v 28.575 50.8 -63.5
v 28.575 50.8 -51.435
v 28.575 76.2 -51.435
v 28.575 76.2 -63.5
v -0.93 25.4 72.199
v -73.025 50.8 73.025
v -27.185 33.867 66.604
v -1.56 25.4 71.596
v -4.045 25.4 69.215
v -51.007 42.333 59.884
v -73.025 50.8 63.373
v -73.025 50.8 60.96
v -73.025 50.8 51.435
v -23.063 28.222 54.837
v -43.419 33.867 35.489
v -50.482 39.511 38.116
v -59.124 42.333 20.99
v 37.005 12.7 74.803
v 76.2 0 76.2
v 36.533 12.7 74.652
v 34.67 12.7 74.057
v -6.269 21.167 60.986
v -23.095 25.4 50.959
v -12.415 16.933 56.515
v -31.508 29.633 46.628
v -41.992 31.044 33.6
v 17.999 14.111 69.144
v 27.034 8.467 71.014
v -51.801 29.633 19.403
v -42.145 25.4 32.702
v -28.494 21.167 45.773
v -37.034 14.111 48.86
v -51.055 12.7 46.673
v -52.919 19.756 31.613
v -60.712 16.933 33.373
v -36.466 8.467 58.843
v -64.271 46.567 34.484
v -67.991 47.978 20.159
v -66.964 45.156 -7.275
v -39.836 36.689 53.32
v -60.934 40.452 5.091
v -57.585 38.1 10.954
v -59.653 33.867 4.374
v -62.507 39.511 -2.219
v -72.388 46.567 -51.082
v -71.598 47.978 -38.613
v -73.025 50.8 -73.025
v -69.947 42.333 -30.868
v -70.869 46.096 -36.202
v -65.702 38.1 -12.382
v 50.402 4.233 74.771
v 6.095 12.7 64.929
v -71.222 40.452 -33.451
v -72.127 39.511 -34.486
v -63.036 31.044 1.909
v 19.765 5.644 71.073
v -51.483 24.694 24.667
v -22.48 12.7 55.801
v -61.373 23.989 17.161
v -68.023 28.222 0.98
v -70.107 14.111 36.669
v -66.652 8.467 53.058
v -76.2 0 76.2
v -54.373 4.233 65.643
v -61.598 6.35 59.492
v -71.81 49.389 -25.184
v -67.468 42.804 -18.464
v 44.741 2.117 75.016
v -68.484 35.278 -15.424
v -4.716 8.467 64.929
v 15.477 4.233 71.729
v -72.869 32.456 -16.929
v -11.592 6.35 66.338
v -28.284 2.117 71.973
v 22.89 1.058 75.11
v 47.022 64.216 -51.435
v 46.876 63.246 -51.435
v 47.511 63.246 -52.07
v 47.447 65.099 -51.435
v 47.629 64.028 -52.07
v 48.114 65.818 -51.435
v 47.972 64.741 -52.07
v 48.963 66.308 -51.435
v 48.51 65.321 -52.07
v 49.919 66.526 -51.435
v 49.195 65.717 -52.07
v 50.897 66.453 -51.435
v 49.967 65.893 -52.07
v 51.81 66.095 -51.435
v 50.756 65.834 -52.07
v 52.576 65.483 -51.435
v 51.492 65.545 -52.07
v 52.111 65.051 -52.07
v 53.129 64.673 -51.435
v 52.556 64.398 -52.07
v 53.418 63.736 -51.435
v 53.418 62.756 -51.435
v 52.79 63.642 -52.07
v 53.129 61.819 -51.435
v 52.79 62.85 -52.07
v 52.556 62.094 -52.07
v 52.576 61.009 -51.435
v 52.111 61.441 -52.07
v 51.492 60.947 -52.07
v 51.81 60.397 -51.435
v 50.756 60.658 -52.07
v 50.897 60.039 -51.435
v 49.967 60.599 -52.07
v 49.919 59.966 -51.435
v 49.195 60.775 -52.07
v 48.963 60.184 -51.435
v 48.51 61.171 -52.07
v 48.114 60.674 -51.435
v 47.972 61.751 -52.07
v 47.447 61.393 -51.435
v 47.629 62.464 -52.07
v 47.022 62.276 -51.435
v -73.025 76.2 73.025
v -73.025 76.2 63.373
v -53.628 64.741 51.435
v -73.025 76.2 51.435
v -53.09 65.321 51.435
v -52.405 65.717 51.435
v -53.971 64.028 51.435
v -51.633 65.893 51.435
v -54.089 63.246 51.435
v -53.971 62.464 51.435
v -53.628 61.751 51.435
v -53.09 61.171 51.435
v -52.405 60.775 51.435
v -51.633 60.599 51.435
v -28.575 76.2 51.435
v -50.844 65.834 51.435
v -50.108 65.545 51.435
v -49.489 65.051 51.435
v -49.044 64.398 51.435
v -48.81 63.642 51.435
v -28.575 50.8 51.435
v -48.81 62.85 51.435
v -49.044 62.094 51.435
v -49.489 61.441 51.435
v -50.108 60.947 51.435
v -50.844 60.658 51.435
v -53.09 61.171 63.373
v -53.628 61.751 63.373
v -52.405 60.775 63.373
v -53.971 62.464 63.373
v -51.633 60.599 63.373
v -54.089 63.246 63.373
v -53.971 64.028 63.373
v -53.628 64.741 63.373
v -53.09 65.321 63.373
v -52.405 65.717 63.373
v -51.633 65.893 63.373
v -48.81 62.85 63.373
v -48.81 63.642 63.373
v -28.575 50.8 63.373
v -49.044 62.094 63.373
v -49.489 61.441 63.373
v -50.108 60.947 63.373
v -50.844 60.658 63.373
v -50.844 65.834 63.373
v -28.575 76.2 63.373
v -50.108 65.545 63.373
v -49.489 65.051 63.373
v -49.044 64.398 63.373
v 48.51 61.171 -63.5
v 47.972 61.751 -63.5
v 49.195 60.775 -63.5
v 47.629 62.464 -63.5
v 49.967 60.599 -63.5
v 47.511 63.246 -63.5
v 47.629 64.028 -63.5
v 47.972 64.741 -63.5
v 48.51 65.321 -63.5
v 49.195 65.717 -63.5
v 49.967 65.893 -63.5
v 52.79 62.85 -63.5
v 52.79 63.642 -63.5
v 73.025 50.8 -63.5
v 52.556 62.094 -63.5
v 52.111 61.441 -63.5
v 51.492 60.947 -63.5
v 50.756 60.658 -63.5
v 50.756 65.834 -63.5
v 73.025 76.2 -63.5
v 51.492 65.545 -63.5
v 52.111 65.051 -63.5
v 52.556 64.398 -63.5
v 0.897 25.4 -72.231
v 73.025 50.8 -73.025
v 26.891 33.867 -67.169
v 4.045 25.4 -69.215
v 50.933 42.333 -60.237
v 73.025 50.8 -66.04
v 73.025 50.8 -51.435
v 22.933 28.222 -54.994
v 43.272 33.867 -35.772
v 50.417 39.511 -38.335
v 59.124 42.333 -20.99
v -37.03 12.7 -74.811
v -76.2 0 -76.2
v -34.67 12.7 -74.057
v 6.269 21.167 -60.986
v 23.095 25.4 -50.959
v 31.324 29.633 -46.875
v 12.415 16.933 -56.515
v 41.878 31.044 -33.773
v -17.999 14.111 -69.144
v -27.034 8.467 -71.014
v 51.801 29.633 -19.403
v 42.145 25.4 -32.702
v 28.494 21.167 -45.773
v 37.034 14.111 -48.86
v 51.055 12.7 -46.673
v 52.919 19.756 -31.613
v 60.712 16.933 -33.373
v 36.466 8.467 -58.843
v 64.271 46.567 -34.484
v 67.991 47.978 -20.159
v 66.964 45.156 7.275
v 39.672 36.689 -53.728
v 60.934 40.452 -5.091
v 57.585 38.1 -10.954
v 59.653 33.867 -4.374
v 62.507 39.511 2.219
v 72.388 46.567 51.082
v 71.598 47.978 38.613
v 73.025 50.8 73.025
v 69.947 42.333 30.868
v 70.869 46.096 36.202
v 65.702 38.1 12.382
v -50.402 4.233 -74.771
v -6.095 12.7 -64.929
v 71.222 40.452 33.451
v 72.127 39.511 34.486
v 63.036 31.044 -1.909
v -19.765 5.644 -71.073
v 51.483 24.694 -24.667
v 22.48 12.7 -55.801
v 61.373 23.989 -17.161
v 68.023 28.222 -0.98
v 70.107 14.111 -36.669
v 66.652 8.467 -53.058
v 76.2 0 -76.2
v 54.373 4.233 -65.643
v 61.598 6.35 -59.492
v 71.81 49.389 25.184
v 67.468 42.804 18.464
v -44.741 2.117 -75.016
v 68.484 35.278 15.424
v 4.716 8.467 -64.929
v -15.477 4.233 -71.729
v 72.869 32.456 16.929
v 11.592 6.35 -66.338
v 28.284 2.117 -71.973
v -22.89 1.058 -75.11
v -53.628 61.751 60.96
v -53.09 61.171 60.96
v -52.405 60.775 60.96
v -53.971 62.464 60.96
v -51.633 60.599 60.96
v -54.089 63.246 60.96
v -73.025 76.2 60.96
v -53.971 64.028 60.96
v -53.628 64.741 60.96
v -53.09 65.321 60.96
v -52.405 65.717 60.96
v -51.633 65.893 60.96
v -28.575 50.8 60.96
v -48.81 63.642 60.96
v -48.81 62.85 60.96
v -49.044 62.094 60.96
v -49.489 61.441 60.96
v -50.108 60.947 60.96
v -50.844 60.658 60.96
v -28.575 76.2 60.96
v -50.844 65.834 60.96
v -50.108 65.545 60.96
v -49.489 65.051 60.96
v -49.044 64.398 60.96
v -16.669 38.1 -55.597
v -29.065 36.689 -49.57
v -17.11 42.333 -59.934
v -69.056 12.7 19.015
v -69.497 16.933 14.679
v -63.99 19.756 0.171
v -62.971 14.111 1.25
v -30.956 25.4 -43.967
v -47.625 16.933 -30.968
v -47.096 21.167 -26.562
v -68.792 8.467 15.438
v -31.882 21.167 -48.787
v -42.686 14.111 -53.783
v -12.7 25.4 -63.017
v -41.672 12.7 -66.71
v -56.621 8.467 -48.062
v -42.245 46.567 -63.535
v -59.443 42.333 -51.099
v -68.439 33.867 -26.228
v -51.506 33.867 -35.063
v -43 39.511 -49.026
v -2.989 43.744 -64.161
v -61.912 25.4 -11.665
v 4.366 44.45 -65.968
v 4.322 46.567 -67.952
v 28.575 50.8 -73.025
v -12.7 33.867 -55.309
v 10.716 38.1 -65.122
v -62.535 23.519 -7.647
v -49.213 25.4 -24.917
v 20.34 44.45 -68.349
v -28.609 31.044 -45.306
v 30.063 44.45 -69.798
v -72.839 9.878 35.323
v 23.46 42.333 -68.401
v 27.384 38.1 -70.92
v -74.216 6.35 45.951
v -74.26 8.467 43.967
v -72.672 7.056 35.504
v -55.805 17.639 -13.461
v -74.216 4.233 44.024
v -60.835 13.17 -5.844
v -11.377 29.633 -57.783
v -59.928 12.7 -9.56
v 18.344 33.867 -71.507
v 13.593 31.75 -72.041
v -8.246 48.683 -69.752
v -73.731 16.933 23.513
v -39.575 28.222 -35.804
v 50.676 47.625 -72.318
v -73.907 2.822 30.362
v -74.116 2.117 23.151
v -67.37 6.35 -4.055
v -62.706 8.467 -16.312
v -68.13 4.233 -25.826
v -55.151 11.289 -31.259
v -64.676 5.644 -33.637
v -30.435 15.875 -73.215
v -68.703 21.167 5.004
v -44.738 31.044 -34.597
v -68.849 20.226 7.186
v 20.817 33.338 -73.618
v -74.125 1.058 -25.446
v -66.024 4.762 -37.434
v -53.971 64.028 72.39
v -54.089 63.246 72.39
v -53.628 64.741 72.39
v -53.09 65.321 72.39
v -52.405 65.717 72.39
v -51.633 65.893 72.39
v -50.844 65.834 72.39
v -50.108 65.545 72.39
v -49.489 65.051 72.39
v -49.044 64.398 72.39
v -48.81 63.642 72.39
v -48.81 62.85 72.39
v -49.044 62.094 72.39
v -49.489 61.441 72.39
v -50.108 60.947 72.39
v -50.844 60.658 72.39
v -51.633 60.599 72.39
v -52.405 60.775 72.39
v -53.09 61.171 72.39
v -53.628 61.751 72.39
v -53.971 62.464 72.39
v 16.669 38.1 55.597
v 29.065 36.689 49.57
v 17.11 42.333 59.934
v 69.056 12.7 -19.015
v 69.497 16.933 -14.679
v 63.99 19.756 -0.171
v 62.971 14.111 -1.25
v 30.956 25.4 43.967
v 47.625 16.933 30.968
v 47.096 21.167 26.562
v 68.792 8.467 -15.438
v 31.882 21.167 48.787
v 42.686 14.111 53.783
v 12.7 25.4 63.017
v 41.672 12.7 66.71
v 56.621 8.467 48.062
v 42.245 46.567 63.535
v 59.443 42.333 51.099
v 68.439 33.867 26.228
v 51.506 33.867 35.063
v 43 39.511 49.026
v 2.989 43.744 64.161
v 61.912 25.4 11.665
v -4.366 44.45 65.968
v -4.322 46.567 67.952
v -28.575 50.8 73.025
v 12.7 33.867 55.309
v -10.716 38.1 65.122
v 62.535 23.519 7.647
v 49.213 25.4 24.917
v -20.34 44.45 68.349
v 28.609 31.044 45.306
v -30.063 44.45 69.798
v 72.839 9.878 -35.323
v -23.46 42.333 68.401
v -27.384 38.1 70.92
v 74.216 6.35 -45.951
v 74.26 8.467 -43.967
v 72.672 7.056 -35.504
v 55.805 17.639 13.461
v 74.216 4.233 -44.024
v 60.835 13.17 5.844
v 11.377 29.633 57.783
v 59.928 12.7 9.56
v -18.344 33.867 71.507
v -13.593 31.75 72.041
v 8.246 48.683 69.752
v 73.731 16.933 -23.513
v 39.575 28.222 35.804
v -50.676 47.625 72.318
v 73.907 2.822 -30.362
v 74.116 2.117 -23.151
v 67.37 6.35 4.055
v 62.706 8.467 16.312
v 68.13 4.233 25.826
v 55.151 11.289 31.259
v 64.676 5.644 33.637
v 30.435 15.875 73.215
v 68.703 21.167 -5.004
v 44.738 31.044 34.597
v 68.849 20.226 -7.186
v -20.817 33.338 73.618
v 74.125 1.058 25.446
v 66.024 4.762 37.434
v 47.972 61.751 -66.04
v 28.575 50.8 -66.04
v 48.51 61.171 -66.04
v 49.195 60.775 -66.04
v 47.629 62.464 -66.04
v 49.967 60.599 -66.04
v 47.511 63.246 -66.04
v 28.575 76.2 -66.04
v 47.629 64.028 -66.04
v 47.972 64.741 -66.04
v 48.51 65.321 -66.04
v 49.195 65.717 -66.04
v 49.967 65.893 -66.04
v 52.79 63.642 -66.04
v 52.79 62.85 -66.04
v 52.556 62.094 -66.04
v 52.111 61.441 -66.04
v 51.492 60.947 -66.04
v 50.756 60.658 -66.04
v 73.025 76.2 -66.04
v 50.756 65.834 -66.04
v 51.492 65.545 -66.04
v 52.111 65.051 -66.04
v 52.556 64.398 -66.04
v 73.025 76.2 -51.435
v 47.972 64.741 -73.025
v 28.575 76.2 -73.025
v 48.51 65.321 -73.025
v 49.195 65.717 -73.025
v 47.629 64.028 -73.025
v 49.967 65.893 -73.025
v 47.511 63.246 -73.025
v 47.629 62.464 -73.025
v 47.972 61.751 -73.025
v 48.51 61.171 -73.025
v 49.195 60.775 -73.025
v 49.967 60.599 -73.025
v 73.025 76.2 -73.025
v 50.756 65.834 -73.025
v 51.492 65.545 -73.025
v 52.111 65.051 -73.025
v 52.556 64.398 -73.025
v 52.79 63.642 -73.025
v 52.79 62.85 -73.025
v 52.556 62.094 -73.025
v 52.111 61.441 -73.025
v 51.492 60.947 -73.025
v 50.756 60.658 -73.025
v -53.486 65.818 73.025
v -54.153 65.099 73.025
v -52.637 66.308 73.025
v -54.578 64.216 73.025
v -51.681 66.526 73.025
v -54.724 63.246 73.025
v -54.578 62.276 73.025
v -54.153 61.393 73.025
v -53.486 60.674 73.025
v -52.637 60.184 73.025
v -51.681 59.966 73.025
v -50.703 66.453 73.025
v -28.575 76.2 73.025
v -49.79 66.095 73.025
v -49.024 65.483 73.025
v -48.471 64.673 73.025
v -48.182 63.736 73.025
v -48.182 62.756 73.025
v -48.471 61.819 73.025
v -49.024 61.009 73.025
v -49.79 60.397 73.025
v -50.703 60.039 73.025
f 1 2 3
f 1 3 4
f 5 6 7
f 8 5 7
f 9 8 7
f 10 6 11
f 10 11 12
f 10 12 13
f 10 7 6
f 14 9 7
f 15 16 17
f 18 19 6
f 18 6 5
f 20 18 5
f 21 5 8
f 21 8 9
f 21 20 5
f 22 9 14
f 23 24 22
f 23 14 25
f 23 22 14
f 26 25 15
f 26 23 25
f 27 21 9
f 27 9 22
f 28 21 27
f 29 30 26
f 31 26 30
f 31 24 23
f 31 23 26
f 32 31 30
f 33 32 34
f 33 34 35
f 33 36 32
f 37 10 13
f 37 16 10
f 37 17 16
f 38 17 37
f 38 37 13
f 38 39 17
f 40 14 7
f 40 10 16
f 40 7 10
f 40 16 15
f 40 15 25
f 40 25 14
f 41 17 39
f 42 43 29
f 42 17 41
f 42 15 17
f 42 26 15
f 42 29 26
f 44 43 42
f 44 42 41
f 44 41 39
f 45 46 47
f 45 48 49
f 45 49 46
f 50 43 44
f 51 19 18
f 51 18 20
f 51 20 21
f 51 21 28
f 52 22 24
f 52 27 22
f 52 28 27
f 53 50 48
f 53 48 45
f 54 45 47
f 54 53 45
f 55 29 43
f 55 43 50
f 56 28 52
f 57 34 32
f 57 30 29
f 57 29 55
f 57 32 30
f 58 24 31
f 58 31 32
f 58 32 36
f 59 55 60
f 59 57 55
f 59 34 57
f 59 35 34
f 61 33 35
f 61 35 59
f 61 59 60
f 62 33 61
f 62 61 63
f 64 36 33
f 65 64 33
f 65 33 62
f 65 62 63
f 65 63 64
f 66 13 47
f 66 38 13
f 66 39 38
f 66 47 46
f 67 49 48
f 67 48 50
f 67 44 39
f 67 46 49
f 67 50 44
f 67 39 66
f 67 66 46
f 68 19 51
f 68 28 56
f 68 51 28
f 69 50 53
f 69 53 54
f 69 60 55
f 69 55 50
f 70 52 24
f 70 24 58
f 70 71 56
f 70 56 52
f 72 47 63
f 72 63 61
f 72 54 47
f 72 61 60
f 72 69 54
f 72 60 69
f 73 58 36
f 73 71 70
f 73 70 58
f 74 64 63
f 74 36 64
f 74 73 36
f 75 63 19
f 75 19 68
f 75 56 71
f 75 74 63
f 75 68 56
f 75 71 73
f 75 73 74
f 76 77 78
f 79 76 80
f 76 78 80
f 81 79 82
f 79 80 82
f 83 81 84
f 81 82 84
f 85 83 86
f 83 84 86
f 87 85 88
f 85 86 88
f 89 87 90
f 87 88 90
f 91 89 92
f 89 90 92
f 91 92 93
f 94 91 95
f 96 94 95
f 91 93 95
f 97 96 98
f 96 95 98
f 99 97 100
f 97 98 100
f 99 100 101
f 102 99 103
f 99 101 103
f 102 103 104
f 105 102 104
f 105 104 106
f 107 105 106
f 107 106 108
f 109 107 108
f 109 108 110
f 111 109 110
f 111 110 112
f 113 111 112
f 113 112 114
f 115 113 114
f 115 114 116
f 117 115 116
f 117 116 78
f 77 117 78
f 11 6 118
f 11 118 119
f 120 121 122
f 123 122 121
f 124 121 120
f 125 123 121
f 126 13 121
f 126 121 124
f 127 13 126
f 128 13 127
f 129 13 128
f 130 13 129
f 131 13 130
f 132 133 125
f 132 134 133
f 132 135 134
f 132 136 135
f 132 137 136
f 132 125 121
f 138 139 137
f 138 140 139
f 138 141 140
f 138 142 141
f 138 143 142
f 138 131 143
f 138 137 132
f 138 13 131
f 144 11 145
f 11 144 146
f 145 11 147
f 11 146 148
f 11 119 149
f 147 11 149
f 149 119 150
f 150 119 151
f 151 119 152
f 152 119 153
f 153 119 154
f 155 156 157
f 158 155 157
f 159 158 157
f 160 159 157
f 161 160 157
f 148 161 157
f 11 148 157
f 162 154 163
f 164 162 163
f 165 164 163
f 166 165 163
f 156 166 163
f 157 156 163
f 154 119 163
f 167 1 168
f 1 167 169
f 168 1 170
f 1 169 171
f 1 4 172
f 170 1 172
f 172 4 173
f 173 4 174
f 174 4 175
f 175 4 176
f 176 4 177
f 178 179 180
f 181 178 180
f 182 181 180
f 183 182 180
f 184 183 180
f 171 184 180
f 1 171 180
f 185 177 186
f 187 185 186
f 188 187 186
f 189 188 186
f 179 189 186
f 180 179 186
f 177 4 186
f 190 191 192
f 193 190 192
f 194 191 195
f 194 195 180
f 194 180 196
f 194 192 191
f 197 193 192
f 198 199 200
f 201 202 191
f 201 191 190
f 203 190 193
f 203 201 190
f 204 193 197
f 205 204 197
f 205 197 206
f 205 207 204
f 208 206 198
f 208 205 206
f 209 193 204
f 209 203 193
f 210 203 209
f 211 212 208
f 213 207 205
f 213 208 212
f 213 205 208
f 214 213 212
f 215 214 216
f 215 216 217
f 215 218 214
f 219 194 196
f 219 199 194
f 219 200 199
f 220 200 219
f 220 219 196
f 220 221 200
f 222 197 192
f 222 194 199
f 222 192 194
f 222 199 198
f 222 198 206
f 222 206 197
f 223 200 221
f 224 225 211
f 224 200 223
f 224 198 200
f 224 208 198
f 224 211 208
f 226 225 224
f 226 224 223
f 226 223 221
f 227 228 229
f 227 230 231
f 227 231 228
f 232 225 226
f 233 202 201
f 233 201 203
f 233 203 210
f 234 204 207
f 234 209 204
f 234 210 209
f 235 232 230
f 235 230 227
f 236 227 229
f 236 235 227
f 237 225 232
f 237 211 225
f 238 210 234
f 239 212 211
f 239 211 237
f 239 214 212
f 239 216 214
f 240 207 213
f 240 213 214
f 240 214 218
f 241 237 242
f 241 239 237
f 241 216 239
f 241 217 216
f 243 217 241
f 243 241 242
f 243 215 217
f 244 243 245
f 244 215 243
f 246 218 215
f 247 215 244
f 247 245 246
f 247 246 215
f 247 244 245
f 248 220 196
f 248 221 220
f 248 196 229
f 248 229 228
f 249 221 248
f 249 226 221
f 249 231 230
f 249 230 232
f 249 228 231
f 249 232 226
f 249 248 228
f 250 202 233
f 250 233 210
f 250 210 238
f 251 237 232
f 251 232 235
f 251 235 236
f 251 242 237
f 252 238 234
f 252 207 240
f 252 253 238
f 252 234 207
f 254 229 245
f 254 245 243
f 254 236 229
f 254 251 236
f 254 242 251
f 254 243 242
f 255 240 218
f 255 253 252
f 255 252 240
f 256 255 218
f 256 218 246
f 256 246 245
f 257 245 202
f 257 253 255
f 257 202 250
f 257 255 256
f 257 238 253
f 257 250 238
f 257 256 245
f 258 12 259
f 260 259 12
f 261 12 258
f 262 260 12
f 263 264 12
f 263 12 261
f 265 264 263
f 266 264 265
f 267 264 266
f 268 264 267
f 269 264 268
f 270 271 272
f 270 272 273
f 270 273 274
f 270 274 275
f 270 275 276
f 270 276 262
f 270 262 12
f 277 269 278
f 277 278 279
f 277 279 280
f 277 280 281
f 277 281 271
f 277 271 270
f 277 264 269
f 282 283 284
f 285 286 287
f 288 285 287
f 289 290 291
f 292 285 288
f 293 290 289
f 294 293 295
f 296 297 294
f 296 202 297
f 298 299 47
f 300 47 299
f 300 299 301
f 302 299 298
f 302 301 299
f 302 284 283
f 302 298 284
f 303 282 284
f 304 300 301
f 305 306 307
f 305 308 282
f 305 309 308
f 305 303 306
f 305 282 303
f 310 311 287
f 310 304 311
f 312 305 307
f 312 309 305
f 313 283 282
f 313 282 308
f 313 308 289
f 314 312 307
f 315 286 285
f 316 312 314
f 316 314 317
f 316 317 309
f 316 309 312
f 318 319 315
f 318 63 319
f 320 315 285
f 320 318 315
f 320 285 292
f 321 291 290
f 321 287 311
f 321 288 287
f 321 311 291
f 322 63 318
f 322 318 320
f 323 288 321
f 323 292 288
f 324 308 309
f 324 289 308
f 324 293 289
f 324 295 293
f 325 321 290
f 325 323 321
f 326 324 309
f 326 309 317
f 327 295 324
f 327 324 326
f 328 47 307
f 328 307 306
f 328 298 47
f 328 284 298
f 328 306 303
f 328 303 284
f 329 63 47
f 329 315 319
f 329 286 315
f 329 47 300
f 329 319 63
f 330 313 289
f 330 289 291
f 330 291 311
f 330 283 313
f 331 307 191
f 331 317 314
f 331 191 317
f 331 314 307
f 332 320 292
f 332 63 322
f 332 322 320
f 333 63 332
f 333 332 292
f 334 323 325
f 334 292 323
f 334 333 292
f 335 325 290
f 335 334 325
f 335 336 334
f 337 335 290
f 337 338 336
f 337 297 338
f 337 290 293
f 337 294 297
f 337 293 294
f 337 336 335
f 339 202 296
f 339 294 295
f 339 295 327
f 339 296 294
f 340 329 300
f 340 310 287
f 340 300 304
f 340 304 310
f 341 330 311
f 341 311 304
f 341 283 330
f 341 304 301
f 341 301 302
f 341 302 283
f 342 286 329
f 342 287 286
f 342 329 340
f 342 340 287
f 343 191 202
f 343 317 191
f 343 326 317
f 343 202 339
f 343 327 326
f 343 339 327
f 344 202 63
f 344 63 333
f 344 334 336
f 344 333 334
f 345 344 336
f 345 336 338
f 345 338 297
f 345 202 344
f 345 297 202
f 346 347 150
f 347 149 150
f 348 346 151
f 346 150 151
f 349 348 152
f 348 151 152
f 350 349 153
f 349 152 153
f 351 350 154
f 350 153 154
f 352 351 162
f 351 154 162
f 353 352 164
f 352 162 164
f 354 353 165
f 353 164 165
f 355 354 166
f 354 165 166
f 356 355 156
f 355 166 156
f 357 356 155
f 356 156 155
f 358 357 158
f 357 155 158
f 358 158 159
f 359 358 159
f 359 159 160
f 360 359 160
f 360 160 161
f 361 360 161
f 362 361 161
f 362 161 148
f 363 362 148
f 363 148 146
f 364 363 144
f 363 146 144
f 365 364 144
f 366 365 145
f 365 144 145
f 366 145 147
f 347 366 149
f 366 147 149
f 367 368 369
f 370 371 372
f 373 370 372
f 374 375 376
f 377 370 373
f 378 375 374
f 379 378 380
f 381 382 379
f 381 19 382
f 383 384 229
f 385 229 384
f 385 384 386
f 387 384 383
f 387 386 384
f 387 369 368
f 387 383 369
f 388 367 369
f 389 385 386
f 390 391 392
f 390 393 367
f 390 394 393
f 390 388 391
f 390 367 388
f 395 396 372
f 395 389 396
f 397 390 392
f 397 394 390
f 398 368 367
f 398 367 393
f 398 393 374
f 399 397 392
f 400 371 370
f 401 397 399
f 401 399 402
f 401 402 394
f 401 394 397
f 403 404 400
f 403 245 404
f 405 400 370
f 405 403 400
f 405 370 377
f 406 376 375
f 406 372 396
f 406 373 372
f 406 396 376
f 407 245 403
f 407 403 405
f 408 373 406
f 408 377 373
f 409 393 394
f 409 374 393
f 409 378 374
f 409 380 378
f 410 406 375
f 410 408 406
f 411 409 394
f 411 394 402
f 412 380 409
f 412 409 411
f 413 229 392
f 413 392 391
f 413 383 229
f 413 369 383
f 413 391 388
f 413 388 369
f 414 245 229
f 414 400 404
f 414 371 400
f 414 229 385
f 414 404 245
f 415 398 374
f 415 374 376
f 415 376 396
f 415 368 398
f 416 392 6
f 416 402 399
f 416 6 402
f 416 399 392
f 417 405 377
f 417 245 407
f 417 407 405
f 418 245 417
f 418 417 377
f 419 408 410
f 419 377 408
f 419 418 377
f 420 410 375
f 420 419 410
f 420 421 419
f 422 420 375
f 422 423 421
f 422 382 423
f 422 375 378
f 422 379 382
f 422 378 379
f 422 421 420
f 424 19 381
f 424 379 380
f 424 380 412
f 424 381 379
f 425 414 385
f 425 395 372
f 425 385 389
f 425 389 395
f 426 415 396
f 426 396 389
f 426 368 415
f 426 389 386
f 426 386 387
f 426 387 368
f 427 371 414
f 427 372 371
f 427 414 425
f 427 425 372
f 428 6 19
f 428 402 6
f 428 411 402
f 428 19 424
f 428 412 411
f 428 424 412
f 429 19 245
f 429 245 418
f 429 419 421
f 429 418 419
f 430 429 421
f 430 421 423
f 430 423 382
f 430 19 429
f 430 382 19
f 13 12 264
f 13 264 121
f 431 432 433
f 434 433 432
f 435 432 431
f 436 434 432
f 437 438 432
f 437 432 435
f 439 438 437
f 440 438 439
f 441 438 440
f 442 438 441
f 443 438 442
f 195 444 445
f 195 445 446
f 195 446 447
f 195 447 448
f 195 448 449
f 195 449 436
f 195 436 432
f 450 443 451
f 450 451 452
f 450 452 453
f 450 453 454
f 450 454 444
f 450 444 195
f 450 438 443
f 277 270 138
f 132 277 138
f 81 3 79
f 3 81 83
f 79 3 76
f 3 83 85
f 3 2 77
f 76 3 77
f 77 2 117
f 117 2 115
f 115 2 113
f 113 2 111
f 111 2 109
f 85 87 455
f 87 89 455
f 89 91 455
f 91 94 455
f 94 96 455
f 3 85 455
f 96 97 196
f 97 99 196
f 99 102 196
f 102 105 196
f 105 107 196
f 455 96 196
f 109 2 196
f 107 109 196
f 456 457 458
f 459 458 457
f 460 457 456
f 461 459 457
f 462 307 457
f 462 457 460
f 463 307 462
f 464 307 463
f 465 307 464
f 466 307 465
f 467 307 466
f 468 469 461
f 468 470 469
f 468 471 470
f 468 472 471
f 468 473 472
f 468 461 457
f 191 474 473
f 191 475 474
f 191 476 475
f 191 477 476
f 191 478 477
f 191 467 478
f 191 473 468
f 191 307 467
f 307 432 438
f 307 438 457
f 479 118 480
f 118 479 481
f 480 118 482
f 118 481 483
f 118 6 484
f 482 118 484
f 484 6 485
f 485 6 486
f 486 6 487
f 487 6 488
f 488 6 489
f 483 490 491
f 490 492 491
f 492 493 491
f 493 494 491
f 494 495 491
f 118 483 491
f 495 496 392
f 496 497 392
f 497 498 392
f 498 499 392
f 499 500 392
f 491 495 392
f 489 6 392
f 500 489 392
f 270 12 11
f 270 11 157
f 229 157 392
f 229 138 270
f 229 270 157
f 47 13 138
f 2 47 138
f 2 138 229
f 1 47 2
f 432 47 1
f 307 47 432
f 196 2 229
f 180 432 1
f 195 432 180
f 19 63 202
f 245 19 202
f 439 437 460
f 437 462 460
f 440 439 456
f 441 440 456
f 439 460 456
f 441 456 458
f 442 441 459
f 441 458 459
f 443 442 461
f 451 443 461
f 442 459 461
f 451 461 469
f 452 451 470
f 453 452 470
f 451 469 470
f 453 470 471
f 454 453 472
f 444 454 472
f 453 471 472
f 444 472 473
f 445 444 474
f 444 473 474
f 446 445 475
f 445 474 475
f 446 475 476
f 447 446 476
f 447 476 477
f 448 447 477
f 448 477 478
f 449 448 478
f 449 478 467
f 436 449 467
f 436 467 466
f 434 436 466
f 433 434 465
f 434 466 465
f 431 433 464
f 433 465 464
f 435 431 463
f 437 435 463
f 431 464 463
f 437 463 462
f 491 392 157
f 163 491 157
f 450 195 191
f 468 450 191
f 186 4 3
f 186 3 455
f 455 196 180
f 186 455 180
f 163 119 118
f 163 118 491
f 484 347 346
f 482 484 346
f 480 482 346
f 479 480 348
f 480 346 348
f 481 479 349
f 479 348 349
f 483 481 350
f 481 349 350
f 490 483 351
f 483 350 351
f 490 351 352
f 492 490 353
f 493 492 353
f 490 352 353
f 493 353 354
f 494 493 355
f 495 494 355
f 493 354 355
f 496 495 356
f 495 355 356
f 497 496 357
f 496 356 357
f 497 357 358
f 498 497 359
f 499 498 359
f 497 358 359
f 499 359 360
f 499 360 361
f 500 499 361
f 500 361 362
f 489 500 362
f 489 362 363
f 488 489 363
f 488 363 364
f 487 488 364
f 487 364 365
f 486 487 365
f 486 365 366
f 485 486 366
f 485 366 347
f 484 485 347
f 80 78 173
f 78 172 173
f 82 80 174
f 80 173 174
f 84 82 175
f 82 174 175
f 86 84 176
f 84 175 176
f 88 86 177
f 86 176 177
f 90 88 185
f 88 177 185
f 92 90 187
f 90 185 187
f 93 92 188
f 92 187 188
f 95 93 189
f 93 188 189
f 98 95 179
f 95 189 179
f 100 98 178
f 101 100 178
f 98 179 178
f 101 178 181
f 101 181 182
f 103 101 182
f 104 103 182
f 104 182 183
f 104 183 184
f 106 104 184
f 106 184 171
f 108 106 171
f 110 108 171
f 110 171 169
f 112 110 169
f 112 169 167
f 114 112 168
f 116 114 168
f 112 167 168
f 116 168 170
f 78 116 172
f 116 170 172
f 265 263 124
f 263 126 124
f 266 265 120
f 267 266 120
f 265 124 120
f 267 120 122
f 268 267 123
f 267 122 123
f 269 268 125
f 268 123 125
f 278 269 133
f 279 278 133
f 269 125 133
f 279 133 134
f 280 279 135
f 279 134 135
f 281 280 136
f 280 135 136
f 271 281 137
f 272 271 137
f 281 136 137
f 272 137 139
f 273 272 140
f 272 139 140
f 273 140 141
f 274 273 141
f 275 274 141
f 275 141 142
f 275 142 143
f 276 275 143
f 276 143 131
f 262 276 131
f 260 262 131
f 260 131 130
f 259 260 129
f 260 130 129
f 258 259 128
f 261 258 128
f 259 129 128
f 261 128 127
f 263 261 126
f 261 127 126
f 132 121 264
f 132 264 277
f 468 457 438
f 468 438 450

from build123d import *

# Parameters (mm, degrees)
SKETCH20_W                           = 44.45
SKETCH20_H                           = 21.59
BOSS_EXTRUDE3_DEPTH                  = 25.4
SKETCH22_W                           = 44.45
SKETCH22_H                           = 2.413
CUT_EXTRUDE2_DEPTH                   = 25.4
SKETCH23_W                           = 44.45
SKETCH23_H                           = 2.54
CUT_EXTRUDE3_DEPTH                   = 25.4
F_4_0_209_DIAMETER_HOLE6_D           = 5.3086
F_4_0_209_DIAMETER_HOLE6_CSINK_D     = 6.5786
F_4_0_209_DIAMETER_HOLE6_CSINK_ANGLE = 90
F_4_0_209_DIAMETER_HOLE7_D           = 5.3086
F_4_0_209_DIAMETER_HOLE7_CSINK_D     = 6.5786
F_4_0_209_DIAMETER_HOLE7_CSINK_ANGLE = 90


with BuildPart() as part:
    # Loft1: read off the stored shape, not the designer's step
    # Loft1: loft between two sections, ruled curve by curve
    loft1_from = [
        Edge.make_bspline([(-73.025, 50.8, -73.025), (-48.683333333, 50.8, -73.025), (-24.341666667, 50.8, -73.025), (24.341666667, 50.8, -73.025), (48.683333333, 50.8, -73.025), (73.025, 50.8, -73.025)], [0, 0, 0, 0, 0.5, 0.5, 1, 1, 1, 1], 3),
        Edge.make_bspline([(73.025, 50.8, -73.025), (73.025, 50.8, -48.683333333), (73.025, 50.8, -24.341666667), (73.025, 50.8, 24.341666667), (73.025, 50.8, 48.683333333), (73.025, 50.8, 73.025)], [0, 0, 0, 0, 0.5, 0.5, 1, 1, 1, 1], 3),
        Edge.make_bspline([(-73.025, 50.8, 73.025), (-73.025, 50.8, 48.683333333), (-73.025, 50.8, 24.341666667), (-73.025, 50.8, -24.341666667), (-73.025, 50.8, -48.683333333), (-73.025, 50.8, -73.025)], [0, 0, 0, 0, 0.5, 0.5, 1, 1, 1, 1], 3),
        Edge.make_bspline([(73.025, 50.8, 73.025), (48.683333333, 50.8, 73.025), (24.341666667, 50.8, 73.025), (-24.341666667, 50.8, 73.025), (-48.683333333, 50.8, 73.025), (-73.025, 50.8, 73.025)], [0, 0, 0, 0, 0.5, 0.5, 1, 1, 1, 1], 3),
    ]
    loft1_to = [
        Edge.make_bspline([(-76.2, 0, 76.2), (-76.2, 0, 50.8), (-76.2, 0, 25.4), (-76.2, 0, -25.4), (-76.2, 0, -50.8), (-76.2, 0, -76.2)], [0, 0, 0, 0, 0.5, 0.5, 1, 1, 1, 1], 3),
        Edge.make_bspline([(-76.2, 0, -76.2), (-50.8, 0, -76.2), (-25.4, 0, -76.2), (25.4, 0, -76.2), (50.8, 0, -76.2), (76.2, 0, -76.2)], [0, 0, 0, 0, 0.5, 0.5, 1, 1, 1, 1], 3),
        Edge.make_bspline([(76.2, 0, 76.2), (50.8, 0, 76.2), (25.4, 0, 76.2), (-25.4, 0, 76.2), (-50.8, 0, 76.2), (-76.2, 0, 76.2)], [0, 0, 0, 0, 0.5, 0.5, 1, 1, 1, 1], 3),
        Edge.make_bspline([(76.2, 0, -76.2), (76.2, 0, -50.8), (76.2, 0, -25.4), (76.2, 0, 25.4), (76.2, 0, 50.8), (76.2, 0, 76.2)], [0, 0, 0, 0, 0.5, 0.5, 1, 1, 1, 1], 3),
    ]
    loft1 = Solid(Shell([*[Face.make_surface_from_curves(loft1_from[k], loft1_to[k]) for k in range(4)], Face(Wire(loft1_from)), Face(Wire(loft1_to))]))
    add(loft1)

    # Sketch20 → Boss-Extrude3 (add)
    with BuildSketch(Plane(origin=(0, 50.8, 0), x_dir=(1, 0, 0), z_dir=(0, 1, 0))):
        with Locations((-50.8, -62.23)):
            Rectangle(SKETCH20_W, SKETCH20_H)
        with Locations((50.8, 62.23)):
            Rectangle(SKETCH20_W, SKETCH20_H)
    extrude(amount=BOSS_EXTRUDE3_DEPTH)

    # Sketch22 → Cut-Extrude2 (cut)
    with BuildSketch(Plane(origin=(0, 76.2, 0), x_dir=(1, 0, 0), z_dir=(0, 1, 0))):
        with Locations((-50.8, -62.1665)):
            Rectangle(SKETCH22_W, SKETCH22_H)
    extrude(amount=-CUT_EXTRUDE2_DEPTH, mode=Mode.SUBTRACT)

    # Sketch23 → Cut-Extrude3 (cut)
    with BuildSketch(Plane(origin=(0, 76.2, 0), x_dir=(1, 0, 0), z_dir=(0, 1, 0))):
        with Locations((50.8, 64.77)):
            Rectangle(SKETCH23_W, SKETCH23_H)
    extrude(amount=-CUT_EXTRUDE3_DEPTH, mode=Mode.SUBTRACT)

    # #4 (0.209) Diameter Hole6 (through all)
    with Locations(Plane.XY.offset(73.025)):
        with Locations((-51.435, 63.246)):
            CounterSinkHole(F_4_0_209_DIAMETER_HOLE6_D / 2, F_4_0_209_DIAMETER_HOLE6_CSINK_D / 2, counter_sink_angle=F_4_0_209_DIAMETER_HOLE6_CSINK_ANGLE)

    # #4 (0.209) Diameter Hole7 (through all)
    with Locations(Plane.XY.offset(-51.435)):
        with Locations((50.165, 63.246)):
            CounterSinkHole(F_4_0_209_DIAMETER_HOLE7_D / 2, F_4_0_209_DIAMETER_HOLE7_CSINK_D / 2, counter_sink_angle=F_4_0_209_DIAMETER_HOLE7_CSINK_ANGLE)


solid = part.part
